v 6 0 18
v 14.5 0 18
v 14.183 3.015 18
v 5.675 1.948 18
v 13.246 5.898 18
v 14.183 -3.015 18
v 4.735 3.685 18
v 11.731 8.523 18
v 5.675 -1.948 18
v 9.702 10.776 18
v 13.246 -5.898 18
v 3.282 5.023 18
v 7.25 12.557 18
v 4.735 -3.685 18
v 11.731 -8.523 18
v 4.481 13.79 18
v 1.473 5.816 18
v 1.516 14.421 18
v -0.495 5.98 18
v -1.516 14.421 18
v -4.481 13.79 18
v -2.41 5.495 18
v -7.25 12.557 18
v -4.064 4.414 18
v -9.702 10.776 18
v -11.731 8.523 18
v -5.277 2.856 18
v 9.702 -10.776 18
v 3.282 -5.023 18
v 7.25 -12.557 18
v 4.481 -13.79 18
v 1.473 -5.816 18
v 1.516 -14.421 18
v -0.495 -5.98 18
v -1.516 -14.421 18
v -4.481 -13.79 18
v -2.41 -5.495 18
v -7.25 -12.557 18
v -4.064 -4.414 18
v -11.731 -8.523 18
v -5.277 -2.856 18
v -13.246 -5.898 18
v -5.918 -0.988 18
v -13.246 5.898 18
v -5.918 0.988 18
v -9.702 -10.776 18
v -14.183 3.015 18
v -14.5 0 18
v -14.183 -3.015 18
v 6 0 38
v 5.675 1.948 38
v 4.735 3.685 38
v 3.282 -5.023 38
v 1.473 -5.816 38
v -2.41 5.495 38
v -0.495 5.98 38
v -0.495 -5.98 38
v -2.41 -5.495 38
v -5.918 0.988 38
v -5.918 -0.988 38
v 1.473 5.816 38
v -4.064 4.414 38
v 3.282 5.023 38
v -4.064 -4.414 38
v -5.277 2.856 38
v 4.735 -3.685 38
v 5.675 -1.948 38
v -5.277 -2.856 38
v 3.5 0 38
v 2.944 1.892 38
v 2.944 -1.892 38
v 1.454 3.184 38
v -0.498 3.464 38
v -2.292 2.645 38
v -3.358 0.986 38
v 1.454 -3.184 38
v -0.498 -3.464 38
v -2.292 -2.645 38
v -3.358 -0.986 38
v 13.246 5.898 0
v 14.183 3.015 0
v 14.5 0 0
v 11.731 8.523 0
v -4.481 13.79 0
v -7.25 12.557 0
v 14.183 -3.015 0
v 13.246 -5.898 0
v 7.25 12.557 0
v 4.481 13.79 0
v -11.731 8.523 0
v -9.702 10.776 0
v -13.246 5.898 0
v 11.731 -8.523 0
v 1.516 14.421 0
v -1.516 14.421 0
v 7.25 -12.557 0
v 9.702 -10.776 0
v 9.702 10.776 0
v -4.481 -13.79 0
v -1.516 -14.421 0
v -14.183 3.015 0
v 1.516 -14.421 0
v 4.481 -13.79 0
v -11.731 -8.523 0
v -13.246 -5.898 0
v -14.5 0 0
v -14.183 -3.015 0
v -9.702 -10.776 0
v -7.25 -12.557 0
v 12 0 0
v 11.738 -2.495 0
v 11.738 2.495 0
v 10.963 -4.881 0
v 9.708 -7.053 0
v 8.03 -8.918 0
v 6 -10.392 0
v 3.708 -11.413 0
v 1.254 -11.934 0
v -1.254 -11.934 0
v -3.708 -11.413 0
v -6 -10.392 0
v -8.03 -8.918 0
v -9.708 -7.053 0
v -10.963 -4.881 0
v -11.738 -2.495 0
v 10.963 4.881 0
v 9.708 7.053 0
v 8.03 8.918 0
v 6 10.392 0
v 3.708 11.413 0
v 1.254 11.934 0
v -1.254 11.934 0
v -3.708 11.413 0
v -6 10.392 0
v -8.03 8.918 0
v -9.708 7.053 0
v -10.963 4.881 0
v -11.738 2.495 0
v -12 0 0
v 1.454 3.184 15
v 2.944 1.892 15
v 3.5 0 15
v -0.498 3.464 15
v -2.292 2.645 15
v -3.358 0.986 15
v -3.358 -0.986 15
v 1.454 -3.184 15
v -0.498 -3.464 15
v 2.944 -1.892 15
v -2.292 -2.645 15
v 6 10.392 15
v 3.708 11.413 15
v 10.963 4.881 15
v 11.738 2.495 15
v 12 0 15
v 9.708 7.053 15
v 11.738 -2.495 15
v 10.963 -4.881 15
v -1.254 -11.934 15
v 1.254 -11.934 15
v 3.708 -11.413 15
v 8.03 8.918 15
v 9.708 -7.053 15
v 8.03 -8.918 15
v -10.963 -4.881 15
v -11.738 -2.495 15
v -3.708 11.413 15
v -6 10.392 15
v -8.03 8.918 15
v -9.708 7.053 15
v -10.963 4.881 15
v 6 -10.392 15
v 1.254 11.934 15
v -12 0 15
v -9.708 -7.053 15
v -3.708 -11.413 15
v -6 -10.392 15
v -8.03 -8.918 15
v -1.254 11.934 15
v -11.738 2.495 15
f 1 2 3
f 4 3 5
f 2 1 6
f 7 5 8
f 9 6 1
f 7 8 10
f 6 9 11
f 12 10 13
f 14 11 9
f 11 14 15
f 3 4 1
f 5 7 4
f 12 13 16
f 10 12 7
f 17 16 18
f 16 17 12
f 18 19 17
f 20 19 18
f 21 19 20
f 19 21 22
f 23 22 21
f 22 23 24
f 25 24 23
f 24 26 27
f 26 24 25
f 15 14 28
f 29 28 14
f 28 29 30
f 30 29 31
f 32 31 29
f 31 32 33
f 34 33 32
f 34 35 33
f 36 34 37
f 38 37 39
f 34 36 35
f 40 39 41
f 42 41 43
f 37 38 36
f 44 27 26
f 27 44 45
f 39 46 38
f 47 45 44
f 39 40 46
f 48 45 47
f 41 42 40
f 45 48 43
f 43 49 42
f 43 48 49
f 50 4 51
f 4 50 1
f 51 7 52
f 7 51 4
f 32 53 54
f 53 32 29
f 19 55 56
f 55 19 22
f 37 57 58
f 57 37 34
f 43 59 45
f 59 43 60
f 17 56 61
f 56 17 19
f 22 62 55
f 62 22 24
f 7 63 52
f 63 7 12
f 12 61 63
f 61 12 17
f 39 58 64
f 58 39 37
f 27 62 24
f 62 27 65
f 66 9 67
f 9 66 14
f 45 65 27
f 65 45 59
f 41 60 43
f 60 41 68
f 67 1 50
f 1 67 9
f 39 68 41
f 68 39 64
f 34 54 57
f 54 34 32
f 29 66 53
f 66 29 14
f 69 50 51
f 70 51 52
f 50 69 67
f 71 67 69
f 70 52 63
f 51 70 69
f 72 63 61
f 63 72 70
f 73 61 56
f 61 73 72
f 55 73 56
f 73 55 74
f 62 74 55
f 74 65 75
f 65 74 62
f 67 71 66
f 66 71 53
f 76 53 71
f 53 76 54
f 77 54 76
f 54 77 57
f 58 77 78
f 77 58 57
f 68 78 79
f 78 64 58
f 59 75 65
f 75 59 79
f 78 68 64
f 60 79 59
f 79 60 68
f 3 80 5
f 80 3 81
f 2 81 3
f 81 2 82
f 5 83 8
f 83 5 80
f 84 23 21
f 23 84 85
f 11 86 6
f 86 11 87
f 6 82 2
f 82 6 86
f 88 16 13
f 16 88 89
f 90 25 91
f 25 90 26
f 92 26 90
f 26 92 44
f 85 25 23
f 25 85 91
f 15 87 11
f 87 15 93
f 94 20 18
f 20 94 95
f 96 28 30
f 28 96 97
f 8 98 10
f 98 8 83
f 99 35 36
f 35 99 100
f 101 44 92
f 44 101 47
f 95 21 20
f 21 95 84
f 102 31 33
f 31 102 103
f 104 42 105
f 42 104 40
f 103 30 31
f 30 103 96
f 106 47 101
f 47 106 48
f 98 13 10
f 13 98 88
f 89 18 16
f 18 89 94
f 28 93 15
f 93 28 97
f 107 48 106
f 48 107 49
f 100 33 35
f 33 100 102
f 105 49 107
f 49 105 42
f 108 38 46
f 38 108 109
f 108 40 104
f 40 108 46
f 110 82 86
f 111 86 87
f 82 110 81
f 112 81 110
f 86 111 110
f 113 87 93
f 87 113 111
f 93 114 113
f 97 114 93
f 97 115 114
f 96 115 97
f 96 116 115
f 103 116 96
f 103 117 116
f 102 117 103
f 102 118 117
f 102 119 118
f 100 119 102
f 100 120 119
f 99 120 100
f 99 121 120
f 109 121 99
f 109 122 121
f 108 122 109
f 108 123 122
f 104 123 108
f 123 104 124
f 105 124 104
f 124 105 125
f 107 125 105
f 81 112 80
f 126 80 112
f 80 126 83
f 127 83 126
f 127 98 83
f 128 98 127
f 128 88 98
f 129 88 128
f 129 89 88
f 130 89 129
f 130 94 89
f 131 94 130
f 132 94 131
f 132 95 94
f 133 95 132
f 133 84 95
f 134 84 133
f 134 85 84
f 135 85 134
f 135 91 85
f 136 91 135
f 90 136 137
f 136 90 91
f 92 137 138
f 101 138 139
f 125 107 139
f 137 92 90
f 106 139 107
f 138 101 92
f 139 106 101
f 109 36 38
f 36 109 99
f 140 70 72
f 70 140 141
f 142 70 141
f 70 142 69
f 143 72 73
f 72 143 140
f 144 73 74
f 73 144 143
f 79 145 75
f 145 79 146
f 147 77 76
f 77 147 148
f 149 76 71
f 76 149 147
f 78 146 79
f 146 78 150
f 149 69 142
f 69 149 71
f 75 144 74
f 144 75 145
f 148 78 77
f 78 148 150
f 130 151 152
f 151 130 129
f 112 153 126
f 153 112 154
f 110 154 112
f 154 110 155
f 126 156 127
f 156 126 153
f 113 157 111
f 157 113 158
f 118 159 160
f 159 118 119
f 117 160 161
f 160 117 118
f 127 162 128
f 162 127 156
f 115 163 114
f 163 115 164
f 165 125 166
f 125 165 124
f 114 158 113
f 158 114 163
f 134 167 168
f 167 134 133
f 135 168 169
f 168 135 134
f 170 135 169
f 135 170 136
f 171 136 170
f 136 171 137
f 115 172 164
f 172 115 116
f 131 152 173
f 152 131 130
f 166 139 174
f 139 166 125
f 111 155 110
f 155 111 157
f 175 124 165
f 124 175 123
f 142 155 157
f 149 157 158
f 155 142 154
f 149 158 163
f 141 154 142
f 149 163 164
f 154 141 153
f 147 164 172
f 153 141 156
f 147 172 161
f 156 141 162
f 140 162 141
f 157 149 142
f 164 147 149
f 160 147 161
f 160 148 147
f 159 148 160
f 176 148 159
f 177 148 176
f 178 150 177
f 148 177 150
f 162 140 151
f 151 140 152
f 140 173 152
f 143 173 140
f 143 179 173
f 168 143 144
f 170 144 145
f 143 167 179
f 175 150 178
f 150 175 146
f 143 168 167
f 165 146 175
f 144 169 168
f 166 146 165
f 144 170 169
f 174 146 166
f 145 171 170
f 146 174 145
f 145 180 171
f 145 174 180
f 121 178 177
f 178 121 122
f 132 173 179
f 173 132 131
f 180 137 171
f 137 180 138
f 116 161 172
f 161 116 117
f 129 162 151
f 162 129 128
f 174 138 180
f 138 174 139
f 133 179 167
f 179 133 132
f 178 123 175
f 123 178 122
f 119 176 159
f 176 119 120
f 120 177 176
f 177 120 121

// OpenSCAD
r1 = 14.5;
r2 = 12.0;
r3 = 6.0;
r4 = 3.5;
h1 = 20;
h2 = 3;
h3 = 15;

difference() {
  cylinder(r = r1, h = h1+h2+h3);
  translate([0, 0, -1]) cylinder(r = r4, h = h1+h2+h3+2);
  translate([0, 0, -1]) cylinder(r = r2, h = h3+1);
  difference() {
    translate([0, 0, h3+h2]) cylinder(r = r1+1, h = h1+1);
    translate([0, 0, h3+h2+-1]) cylinder(r = r3, h = h1+1);
  }
}
